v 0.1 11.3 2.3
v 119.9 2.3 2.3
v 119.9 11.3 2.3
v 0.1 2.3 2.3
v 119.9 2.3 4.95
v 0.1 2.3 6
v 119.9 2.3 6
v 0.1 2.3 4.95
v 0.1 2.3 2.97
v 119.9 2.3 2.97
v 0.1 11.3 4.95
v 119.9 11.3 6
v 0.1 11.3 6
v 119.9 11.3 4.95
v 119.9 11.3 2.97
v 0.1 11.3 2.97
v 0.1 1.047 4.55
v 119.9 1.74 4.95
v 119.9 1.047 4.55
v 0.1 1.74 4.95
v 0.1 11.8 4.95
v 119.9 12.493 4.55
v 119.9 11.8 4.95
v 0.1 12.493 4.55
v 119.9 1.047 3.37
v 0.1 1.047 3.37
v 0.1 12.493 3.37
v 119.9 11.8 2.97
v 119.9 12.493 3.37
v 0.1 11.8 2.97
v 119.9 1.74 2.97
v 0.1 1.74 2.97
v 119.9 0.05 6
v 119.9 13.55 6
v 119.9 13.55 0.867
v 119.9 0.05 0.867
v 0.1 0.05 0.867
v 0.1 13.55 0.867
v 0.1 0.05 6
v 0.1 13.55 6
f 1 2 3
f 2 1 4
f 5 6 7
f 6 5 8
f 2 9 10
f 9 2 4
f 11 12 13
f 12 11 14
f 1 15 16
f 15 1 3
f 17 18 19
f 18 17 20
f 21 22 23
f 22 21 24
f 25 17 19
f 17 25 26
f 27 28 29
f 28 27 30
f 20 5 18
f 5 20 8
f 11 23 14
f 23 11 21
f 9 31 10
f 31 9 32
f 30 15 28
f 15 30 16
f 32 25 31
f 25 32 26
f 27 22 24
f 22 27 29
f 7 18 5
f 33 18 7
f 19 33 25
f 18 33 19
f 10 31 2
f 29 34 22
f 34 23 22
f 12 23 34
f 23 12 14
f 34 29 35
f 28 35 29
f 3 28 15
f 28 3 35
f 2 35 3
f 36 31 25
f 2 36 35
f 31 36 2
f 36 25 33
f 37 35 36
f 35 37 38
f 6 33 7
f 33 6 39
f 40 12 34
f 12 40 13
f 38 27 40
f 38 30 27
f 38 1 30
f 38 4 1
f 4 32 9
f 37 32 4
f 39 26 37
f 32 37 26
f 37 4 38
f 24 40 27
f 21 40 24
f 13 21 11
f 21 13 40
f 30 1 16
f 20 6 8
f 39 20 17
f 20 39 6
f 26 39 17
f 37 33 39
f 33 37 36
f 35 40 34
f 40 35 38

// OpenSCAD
//WIRE LOOM SQUARE by Spicer
//Customizer version
//Default length is 120mm about 4 3/4 inches half of what was set to print on my 2016 Creator Pro diagonally
//Default width/height is very small at 5mm lid to fit the matching box.
//but that is why the options to scale the length, width, and height.
/* [Global] */
/*Customizer variables begin */

/* [LENGTH IN MM ]  "(size approximate)" */
// 180mm default length increased to a max of 480mm (how are ever going to print that?
 length = 1;//[1:120mm,1.5:180mm,2:240mm,3:360mm,4:480mm]
/* [WIDTH and HEIGHT IN MM]   "(size approximate)" */  
 width = 2;//[1:≈4mm,2:≈8mm,3:≈12mm,4:≈16mm]
 
// Customizer variables end
 
height = width;
 M = [ [ length, 0, 0, 0 ],
       [ 0, width, 0, 0 ],  
       [ 0, 0, height, 0 ],
       [ 0, 0, 0, 1 ] ] ;
 multmatrix(M) {
translate ([0, 5.65, 5.65])  rotate ([180, 0, 0]) {  //flip and adjust
difference() {	
	translate ([0.1,-1.125, 2.65]) cube ([119.8, 6.75, 2.9-height/6]);  //cap start to subtract bottom from, the rest is cut away
union () {  //add the shoulder to main box	
	cube ([120, 4.5, 4.5]);  // main box
	translate ([-0.1, -0.25, 3.5+0.15/height])
	minkowski() {cube ([120, 5.03, 0.38/height]); 
		rotate ([0, 90, 0]) cylinder($fn=6, r=0.4, h=1); } // top lip shoulder
		}
translate ([-0.5, 0.5, 0.5])  
	cube ([122, 3.5, 4]);
}
}
}
